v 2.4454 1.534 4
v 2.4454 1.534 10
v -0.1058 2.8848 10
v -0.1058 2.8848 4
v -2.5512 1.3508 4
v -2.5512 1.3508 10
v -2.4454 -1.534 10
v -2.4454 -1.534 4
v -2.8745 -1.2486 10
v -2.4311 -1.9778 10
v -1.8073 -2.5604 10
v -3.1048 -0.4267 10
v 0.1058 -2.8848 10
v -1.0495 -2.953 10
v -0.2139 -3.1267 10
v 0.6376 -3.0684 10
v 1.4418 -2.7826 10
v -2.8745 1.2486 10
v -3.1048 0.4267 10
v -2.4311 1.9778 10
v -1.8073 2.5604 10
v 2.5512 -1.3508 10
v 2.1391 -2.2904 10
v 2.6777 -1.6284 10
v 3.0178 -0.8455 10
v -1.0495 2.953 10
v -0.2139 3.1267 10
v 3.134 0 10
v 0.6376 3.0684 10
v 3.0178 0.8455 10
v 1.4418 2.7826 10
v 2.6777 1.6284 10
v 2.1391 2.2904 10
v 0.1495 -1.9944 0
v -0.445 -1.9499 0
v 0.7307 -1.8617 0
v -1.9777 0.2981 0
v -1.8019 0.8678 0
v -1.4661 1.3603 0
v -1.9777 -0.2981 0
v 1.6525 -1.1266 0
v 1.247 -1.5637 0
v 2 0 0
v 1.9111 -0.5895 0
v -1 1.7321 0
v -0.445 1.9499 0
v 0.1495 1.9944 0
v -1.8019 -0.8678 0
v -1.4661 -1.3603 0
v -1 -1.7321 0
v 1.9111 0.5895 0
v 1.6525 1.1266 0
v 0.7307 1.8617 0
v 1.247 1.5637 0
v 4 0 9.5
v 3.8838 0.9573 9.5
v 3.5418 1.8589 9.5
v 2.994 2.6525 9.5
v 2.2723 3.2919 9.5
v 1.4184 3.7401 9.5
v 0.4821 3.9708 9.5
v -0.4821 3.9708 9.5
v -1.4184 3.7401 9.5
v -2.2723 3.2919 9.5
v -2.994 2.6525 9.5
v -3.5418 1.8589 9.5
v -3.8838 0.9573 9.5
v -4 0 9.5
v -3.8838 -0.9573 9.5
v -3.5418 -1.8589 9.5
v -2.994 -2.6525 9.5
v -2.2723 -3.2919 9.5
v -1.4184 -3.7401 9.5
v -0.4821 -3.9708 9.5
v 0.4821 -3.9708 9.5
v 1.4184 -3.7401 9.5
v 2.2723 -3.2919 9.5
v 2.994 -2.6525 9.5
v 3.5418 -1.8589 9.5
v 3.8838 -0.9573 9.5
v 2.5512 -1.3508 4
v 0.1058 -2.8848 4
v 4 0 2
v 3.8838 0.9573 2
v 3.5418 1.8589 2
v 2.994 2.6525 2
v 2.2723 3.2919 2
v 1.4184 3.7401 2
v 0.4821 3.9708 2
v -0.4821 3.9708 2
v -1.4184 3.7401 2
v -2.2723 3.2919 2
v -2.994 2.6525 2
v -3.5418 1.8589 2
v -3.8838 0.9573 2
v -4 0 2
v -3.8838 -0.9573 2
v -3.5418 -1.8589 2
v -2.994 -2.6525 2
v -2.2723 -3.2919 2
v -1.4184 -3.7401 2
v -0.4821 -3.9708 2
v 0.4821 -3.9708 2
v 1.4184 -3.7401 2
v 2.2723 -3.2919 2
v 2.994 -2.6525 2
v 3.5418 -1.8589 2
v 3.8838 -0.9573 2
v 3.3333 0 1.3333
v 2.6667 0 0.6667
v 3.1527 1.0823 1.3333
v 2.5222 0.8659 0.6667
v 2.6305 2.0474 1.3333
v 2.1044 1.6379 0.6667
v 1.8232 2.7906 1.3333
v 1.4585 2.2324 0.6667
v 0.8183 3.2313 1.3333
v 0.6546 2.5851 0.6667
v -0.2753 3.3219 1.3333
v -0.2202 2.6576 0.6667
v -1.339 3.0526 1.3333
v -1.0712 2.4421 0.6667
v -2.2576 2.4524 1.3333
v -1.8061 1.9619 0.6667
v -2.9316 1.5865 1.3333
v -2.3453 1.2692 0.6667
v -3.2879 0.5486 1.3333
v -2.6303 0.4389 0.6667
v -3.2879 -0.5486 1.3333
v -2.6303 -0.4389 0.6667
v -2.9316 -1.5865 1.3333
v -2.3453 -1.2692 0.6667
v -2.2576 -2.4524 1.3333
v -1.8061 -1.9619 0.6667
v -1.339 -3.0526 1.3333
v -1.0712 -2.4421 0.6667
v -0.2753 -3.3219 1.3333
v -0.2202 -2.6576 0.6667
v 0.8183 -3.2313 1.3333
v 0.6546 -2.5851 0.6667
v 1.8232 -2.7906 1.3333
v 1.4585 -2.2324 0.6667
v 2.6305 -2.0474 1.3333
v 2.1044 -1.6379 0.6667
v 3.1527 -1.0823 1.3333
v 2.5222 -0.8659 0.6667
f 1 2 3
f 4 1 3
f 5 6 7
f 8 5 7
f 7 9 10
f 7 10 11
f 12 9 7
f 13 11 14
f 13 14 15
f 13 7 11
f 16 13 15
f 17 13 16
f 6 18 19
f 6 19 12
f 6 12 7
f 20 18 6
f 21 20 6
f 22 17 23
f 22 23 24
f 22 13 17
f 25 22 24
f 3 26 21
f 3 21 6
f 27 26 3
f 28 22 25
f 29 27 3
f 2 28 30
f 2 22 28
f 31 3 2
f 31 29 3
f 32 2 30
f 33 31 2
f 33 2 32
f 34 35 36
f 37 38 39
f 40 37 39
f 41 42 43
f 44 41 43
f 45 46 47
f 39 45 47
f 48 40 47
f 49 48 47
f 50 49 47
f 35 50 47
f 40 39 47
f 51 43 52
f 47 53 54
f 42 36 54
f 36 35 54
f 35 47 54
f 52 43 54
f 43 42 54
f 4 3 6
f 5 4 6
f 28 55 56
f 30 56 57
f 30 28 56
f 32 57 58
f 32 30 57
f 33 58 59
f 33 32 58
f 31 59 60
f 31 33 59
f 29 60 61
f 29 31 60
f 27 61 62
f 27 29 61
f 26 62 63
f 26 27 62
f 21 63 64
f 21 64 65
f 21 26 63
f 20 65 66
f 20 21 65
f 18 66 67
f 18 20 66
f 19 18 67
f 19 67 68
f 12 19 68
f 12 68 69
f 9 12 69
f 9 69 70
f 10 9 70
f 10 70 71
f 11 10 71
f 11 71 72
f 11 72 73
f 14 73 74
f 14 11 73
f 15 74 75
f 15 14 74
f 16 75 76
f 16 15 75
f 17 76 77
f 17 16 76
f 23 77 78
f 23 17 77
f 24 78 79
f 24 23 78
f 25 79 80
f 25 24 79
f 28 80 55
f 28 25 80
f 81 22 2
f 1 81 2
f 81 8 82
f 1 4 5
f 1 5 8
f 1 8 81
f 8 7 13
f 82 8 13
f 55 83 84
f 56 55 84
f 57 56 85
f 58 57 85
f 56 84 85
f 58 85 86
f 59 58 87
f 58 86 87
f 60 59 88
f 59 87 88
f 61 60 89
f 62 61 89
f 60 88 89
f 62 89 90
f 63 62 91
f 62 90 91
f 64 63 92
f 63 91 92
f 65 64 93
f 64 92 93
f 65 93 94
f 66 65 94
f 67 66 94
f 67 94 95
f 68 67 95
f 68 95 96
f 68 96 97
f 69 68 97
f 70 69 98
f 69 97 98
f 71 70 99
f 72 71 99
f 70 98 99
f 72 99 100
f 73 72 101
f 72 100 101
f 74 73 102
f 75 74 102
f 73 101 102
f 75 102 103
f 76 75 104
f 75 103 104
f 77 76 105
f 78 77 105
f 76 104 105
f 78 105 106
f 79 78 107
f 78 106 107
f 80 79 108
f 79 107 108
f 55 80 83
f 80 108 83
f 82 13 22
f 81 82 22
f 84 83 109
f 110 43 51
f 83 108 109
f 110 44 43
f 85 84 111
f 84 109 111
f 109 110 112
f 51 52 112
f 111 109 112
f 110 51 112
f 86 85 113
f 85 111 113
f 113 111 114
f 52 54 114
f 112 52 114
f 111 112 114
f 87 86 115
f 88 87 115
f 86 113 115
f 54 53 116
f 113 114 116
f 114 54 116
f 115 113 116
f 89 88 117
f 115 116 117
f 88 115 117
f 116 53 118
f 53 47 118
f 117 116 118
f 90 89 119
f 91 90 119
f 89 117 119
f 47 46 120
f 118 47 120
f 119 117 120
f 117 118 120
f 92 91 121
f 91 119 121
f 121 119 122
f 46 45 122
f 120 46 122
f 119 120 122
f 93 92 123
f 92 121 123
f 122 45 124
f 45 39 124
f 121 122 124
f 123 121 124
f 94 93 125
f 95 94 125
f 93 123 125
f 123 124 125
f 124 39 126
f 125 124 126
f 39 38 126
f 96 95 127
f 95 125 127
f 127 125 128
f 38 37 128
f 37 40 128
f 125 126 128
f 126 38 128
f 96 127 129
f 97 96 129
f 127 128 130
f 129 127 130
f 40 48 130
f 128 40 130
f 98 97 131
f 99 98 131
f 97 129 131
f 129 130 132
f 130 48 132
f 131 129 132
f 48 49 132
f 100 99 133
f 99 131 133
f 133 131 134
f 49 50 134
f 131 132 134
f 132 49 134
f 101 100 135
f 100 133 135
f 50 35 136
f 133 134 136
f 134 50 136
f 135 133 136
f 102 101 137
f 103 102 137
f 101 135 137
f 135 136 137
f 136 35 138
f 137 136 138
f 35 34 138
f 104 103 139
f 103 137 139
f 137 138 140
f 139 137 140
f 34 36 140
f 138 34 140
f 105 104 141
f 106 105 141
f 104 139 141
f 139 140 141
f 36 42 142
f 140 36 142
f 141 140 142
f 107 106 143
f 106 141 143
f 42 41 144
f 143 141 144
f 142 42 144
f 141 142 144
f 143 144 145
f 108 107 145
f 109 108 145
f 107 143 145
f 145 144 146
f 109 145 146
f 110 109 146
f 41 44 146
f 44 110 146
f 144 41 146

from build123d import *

# Parameters (mm, degrees)
ESBO_O1_R                = 4
RESSALTO_EXTRUS_O1_DEPTH = 10
CORTE_EXTRUS_O1_DEPTH    = 6
CHANFRO3_SIZE            = 0.5
CHANFRO3_SIZE2           = 0.866025404
CHANFRO4_SIZE            = 2


with BuildPart() as part:
    # Esboço1 → Ressalto-extrusão1 (new body)
    with BuildSketch(Plane.XY):
        Circle(ESBO_O1_R)
    extrude(amount=RESSALTO_EXTRUS_O1_DEPTH)

    # Esboço2 → Corte-extrusão1 (cut)
    with BuildSketch(Plane.XY.offset(10)):
        Polygon((-0.105817982, 2.88481124), (-2.55122881, 1.350764559), (-2.445410828, -1.53404668), (0.105817982, -2.88481124), (2.55122881, -1.350764559), (2.445410828, 1.53404668), align=None)
    extrude(amount=-CORTE_EXTRUS_O1_DEPTH, mode=Mode.SUBTRACT)

    # Chanfro3
    chanfro3_edges = [part.edges().sort_by_distance(p)[0] for p in [
        (-4, 0, 10),
    ]]
    chanfro3_side = [part.faces().sort_by_distance(p)[0] for p in [
        (-4, 0, 5),
    ]]
    chamfer(chanfro3_edges, length=CHANFRO3_SIZE, length2=CHANFRO3_SIZE2, reference=chanfro3_side[0])

    # Chanfro4
    chanfro4_edges = [part.edges().sort_by_distance(p)[0] for p in [
        (-4, 0, 0),
    ]]
    chamfer(chanfro4_edges, length=CHANFRO4_SIZE)


solid = part.part
